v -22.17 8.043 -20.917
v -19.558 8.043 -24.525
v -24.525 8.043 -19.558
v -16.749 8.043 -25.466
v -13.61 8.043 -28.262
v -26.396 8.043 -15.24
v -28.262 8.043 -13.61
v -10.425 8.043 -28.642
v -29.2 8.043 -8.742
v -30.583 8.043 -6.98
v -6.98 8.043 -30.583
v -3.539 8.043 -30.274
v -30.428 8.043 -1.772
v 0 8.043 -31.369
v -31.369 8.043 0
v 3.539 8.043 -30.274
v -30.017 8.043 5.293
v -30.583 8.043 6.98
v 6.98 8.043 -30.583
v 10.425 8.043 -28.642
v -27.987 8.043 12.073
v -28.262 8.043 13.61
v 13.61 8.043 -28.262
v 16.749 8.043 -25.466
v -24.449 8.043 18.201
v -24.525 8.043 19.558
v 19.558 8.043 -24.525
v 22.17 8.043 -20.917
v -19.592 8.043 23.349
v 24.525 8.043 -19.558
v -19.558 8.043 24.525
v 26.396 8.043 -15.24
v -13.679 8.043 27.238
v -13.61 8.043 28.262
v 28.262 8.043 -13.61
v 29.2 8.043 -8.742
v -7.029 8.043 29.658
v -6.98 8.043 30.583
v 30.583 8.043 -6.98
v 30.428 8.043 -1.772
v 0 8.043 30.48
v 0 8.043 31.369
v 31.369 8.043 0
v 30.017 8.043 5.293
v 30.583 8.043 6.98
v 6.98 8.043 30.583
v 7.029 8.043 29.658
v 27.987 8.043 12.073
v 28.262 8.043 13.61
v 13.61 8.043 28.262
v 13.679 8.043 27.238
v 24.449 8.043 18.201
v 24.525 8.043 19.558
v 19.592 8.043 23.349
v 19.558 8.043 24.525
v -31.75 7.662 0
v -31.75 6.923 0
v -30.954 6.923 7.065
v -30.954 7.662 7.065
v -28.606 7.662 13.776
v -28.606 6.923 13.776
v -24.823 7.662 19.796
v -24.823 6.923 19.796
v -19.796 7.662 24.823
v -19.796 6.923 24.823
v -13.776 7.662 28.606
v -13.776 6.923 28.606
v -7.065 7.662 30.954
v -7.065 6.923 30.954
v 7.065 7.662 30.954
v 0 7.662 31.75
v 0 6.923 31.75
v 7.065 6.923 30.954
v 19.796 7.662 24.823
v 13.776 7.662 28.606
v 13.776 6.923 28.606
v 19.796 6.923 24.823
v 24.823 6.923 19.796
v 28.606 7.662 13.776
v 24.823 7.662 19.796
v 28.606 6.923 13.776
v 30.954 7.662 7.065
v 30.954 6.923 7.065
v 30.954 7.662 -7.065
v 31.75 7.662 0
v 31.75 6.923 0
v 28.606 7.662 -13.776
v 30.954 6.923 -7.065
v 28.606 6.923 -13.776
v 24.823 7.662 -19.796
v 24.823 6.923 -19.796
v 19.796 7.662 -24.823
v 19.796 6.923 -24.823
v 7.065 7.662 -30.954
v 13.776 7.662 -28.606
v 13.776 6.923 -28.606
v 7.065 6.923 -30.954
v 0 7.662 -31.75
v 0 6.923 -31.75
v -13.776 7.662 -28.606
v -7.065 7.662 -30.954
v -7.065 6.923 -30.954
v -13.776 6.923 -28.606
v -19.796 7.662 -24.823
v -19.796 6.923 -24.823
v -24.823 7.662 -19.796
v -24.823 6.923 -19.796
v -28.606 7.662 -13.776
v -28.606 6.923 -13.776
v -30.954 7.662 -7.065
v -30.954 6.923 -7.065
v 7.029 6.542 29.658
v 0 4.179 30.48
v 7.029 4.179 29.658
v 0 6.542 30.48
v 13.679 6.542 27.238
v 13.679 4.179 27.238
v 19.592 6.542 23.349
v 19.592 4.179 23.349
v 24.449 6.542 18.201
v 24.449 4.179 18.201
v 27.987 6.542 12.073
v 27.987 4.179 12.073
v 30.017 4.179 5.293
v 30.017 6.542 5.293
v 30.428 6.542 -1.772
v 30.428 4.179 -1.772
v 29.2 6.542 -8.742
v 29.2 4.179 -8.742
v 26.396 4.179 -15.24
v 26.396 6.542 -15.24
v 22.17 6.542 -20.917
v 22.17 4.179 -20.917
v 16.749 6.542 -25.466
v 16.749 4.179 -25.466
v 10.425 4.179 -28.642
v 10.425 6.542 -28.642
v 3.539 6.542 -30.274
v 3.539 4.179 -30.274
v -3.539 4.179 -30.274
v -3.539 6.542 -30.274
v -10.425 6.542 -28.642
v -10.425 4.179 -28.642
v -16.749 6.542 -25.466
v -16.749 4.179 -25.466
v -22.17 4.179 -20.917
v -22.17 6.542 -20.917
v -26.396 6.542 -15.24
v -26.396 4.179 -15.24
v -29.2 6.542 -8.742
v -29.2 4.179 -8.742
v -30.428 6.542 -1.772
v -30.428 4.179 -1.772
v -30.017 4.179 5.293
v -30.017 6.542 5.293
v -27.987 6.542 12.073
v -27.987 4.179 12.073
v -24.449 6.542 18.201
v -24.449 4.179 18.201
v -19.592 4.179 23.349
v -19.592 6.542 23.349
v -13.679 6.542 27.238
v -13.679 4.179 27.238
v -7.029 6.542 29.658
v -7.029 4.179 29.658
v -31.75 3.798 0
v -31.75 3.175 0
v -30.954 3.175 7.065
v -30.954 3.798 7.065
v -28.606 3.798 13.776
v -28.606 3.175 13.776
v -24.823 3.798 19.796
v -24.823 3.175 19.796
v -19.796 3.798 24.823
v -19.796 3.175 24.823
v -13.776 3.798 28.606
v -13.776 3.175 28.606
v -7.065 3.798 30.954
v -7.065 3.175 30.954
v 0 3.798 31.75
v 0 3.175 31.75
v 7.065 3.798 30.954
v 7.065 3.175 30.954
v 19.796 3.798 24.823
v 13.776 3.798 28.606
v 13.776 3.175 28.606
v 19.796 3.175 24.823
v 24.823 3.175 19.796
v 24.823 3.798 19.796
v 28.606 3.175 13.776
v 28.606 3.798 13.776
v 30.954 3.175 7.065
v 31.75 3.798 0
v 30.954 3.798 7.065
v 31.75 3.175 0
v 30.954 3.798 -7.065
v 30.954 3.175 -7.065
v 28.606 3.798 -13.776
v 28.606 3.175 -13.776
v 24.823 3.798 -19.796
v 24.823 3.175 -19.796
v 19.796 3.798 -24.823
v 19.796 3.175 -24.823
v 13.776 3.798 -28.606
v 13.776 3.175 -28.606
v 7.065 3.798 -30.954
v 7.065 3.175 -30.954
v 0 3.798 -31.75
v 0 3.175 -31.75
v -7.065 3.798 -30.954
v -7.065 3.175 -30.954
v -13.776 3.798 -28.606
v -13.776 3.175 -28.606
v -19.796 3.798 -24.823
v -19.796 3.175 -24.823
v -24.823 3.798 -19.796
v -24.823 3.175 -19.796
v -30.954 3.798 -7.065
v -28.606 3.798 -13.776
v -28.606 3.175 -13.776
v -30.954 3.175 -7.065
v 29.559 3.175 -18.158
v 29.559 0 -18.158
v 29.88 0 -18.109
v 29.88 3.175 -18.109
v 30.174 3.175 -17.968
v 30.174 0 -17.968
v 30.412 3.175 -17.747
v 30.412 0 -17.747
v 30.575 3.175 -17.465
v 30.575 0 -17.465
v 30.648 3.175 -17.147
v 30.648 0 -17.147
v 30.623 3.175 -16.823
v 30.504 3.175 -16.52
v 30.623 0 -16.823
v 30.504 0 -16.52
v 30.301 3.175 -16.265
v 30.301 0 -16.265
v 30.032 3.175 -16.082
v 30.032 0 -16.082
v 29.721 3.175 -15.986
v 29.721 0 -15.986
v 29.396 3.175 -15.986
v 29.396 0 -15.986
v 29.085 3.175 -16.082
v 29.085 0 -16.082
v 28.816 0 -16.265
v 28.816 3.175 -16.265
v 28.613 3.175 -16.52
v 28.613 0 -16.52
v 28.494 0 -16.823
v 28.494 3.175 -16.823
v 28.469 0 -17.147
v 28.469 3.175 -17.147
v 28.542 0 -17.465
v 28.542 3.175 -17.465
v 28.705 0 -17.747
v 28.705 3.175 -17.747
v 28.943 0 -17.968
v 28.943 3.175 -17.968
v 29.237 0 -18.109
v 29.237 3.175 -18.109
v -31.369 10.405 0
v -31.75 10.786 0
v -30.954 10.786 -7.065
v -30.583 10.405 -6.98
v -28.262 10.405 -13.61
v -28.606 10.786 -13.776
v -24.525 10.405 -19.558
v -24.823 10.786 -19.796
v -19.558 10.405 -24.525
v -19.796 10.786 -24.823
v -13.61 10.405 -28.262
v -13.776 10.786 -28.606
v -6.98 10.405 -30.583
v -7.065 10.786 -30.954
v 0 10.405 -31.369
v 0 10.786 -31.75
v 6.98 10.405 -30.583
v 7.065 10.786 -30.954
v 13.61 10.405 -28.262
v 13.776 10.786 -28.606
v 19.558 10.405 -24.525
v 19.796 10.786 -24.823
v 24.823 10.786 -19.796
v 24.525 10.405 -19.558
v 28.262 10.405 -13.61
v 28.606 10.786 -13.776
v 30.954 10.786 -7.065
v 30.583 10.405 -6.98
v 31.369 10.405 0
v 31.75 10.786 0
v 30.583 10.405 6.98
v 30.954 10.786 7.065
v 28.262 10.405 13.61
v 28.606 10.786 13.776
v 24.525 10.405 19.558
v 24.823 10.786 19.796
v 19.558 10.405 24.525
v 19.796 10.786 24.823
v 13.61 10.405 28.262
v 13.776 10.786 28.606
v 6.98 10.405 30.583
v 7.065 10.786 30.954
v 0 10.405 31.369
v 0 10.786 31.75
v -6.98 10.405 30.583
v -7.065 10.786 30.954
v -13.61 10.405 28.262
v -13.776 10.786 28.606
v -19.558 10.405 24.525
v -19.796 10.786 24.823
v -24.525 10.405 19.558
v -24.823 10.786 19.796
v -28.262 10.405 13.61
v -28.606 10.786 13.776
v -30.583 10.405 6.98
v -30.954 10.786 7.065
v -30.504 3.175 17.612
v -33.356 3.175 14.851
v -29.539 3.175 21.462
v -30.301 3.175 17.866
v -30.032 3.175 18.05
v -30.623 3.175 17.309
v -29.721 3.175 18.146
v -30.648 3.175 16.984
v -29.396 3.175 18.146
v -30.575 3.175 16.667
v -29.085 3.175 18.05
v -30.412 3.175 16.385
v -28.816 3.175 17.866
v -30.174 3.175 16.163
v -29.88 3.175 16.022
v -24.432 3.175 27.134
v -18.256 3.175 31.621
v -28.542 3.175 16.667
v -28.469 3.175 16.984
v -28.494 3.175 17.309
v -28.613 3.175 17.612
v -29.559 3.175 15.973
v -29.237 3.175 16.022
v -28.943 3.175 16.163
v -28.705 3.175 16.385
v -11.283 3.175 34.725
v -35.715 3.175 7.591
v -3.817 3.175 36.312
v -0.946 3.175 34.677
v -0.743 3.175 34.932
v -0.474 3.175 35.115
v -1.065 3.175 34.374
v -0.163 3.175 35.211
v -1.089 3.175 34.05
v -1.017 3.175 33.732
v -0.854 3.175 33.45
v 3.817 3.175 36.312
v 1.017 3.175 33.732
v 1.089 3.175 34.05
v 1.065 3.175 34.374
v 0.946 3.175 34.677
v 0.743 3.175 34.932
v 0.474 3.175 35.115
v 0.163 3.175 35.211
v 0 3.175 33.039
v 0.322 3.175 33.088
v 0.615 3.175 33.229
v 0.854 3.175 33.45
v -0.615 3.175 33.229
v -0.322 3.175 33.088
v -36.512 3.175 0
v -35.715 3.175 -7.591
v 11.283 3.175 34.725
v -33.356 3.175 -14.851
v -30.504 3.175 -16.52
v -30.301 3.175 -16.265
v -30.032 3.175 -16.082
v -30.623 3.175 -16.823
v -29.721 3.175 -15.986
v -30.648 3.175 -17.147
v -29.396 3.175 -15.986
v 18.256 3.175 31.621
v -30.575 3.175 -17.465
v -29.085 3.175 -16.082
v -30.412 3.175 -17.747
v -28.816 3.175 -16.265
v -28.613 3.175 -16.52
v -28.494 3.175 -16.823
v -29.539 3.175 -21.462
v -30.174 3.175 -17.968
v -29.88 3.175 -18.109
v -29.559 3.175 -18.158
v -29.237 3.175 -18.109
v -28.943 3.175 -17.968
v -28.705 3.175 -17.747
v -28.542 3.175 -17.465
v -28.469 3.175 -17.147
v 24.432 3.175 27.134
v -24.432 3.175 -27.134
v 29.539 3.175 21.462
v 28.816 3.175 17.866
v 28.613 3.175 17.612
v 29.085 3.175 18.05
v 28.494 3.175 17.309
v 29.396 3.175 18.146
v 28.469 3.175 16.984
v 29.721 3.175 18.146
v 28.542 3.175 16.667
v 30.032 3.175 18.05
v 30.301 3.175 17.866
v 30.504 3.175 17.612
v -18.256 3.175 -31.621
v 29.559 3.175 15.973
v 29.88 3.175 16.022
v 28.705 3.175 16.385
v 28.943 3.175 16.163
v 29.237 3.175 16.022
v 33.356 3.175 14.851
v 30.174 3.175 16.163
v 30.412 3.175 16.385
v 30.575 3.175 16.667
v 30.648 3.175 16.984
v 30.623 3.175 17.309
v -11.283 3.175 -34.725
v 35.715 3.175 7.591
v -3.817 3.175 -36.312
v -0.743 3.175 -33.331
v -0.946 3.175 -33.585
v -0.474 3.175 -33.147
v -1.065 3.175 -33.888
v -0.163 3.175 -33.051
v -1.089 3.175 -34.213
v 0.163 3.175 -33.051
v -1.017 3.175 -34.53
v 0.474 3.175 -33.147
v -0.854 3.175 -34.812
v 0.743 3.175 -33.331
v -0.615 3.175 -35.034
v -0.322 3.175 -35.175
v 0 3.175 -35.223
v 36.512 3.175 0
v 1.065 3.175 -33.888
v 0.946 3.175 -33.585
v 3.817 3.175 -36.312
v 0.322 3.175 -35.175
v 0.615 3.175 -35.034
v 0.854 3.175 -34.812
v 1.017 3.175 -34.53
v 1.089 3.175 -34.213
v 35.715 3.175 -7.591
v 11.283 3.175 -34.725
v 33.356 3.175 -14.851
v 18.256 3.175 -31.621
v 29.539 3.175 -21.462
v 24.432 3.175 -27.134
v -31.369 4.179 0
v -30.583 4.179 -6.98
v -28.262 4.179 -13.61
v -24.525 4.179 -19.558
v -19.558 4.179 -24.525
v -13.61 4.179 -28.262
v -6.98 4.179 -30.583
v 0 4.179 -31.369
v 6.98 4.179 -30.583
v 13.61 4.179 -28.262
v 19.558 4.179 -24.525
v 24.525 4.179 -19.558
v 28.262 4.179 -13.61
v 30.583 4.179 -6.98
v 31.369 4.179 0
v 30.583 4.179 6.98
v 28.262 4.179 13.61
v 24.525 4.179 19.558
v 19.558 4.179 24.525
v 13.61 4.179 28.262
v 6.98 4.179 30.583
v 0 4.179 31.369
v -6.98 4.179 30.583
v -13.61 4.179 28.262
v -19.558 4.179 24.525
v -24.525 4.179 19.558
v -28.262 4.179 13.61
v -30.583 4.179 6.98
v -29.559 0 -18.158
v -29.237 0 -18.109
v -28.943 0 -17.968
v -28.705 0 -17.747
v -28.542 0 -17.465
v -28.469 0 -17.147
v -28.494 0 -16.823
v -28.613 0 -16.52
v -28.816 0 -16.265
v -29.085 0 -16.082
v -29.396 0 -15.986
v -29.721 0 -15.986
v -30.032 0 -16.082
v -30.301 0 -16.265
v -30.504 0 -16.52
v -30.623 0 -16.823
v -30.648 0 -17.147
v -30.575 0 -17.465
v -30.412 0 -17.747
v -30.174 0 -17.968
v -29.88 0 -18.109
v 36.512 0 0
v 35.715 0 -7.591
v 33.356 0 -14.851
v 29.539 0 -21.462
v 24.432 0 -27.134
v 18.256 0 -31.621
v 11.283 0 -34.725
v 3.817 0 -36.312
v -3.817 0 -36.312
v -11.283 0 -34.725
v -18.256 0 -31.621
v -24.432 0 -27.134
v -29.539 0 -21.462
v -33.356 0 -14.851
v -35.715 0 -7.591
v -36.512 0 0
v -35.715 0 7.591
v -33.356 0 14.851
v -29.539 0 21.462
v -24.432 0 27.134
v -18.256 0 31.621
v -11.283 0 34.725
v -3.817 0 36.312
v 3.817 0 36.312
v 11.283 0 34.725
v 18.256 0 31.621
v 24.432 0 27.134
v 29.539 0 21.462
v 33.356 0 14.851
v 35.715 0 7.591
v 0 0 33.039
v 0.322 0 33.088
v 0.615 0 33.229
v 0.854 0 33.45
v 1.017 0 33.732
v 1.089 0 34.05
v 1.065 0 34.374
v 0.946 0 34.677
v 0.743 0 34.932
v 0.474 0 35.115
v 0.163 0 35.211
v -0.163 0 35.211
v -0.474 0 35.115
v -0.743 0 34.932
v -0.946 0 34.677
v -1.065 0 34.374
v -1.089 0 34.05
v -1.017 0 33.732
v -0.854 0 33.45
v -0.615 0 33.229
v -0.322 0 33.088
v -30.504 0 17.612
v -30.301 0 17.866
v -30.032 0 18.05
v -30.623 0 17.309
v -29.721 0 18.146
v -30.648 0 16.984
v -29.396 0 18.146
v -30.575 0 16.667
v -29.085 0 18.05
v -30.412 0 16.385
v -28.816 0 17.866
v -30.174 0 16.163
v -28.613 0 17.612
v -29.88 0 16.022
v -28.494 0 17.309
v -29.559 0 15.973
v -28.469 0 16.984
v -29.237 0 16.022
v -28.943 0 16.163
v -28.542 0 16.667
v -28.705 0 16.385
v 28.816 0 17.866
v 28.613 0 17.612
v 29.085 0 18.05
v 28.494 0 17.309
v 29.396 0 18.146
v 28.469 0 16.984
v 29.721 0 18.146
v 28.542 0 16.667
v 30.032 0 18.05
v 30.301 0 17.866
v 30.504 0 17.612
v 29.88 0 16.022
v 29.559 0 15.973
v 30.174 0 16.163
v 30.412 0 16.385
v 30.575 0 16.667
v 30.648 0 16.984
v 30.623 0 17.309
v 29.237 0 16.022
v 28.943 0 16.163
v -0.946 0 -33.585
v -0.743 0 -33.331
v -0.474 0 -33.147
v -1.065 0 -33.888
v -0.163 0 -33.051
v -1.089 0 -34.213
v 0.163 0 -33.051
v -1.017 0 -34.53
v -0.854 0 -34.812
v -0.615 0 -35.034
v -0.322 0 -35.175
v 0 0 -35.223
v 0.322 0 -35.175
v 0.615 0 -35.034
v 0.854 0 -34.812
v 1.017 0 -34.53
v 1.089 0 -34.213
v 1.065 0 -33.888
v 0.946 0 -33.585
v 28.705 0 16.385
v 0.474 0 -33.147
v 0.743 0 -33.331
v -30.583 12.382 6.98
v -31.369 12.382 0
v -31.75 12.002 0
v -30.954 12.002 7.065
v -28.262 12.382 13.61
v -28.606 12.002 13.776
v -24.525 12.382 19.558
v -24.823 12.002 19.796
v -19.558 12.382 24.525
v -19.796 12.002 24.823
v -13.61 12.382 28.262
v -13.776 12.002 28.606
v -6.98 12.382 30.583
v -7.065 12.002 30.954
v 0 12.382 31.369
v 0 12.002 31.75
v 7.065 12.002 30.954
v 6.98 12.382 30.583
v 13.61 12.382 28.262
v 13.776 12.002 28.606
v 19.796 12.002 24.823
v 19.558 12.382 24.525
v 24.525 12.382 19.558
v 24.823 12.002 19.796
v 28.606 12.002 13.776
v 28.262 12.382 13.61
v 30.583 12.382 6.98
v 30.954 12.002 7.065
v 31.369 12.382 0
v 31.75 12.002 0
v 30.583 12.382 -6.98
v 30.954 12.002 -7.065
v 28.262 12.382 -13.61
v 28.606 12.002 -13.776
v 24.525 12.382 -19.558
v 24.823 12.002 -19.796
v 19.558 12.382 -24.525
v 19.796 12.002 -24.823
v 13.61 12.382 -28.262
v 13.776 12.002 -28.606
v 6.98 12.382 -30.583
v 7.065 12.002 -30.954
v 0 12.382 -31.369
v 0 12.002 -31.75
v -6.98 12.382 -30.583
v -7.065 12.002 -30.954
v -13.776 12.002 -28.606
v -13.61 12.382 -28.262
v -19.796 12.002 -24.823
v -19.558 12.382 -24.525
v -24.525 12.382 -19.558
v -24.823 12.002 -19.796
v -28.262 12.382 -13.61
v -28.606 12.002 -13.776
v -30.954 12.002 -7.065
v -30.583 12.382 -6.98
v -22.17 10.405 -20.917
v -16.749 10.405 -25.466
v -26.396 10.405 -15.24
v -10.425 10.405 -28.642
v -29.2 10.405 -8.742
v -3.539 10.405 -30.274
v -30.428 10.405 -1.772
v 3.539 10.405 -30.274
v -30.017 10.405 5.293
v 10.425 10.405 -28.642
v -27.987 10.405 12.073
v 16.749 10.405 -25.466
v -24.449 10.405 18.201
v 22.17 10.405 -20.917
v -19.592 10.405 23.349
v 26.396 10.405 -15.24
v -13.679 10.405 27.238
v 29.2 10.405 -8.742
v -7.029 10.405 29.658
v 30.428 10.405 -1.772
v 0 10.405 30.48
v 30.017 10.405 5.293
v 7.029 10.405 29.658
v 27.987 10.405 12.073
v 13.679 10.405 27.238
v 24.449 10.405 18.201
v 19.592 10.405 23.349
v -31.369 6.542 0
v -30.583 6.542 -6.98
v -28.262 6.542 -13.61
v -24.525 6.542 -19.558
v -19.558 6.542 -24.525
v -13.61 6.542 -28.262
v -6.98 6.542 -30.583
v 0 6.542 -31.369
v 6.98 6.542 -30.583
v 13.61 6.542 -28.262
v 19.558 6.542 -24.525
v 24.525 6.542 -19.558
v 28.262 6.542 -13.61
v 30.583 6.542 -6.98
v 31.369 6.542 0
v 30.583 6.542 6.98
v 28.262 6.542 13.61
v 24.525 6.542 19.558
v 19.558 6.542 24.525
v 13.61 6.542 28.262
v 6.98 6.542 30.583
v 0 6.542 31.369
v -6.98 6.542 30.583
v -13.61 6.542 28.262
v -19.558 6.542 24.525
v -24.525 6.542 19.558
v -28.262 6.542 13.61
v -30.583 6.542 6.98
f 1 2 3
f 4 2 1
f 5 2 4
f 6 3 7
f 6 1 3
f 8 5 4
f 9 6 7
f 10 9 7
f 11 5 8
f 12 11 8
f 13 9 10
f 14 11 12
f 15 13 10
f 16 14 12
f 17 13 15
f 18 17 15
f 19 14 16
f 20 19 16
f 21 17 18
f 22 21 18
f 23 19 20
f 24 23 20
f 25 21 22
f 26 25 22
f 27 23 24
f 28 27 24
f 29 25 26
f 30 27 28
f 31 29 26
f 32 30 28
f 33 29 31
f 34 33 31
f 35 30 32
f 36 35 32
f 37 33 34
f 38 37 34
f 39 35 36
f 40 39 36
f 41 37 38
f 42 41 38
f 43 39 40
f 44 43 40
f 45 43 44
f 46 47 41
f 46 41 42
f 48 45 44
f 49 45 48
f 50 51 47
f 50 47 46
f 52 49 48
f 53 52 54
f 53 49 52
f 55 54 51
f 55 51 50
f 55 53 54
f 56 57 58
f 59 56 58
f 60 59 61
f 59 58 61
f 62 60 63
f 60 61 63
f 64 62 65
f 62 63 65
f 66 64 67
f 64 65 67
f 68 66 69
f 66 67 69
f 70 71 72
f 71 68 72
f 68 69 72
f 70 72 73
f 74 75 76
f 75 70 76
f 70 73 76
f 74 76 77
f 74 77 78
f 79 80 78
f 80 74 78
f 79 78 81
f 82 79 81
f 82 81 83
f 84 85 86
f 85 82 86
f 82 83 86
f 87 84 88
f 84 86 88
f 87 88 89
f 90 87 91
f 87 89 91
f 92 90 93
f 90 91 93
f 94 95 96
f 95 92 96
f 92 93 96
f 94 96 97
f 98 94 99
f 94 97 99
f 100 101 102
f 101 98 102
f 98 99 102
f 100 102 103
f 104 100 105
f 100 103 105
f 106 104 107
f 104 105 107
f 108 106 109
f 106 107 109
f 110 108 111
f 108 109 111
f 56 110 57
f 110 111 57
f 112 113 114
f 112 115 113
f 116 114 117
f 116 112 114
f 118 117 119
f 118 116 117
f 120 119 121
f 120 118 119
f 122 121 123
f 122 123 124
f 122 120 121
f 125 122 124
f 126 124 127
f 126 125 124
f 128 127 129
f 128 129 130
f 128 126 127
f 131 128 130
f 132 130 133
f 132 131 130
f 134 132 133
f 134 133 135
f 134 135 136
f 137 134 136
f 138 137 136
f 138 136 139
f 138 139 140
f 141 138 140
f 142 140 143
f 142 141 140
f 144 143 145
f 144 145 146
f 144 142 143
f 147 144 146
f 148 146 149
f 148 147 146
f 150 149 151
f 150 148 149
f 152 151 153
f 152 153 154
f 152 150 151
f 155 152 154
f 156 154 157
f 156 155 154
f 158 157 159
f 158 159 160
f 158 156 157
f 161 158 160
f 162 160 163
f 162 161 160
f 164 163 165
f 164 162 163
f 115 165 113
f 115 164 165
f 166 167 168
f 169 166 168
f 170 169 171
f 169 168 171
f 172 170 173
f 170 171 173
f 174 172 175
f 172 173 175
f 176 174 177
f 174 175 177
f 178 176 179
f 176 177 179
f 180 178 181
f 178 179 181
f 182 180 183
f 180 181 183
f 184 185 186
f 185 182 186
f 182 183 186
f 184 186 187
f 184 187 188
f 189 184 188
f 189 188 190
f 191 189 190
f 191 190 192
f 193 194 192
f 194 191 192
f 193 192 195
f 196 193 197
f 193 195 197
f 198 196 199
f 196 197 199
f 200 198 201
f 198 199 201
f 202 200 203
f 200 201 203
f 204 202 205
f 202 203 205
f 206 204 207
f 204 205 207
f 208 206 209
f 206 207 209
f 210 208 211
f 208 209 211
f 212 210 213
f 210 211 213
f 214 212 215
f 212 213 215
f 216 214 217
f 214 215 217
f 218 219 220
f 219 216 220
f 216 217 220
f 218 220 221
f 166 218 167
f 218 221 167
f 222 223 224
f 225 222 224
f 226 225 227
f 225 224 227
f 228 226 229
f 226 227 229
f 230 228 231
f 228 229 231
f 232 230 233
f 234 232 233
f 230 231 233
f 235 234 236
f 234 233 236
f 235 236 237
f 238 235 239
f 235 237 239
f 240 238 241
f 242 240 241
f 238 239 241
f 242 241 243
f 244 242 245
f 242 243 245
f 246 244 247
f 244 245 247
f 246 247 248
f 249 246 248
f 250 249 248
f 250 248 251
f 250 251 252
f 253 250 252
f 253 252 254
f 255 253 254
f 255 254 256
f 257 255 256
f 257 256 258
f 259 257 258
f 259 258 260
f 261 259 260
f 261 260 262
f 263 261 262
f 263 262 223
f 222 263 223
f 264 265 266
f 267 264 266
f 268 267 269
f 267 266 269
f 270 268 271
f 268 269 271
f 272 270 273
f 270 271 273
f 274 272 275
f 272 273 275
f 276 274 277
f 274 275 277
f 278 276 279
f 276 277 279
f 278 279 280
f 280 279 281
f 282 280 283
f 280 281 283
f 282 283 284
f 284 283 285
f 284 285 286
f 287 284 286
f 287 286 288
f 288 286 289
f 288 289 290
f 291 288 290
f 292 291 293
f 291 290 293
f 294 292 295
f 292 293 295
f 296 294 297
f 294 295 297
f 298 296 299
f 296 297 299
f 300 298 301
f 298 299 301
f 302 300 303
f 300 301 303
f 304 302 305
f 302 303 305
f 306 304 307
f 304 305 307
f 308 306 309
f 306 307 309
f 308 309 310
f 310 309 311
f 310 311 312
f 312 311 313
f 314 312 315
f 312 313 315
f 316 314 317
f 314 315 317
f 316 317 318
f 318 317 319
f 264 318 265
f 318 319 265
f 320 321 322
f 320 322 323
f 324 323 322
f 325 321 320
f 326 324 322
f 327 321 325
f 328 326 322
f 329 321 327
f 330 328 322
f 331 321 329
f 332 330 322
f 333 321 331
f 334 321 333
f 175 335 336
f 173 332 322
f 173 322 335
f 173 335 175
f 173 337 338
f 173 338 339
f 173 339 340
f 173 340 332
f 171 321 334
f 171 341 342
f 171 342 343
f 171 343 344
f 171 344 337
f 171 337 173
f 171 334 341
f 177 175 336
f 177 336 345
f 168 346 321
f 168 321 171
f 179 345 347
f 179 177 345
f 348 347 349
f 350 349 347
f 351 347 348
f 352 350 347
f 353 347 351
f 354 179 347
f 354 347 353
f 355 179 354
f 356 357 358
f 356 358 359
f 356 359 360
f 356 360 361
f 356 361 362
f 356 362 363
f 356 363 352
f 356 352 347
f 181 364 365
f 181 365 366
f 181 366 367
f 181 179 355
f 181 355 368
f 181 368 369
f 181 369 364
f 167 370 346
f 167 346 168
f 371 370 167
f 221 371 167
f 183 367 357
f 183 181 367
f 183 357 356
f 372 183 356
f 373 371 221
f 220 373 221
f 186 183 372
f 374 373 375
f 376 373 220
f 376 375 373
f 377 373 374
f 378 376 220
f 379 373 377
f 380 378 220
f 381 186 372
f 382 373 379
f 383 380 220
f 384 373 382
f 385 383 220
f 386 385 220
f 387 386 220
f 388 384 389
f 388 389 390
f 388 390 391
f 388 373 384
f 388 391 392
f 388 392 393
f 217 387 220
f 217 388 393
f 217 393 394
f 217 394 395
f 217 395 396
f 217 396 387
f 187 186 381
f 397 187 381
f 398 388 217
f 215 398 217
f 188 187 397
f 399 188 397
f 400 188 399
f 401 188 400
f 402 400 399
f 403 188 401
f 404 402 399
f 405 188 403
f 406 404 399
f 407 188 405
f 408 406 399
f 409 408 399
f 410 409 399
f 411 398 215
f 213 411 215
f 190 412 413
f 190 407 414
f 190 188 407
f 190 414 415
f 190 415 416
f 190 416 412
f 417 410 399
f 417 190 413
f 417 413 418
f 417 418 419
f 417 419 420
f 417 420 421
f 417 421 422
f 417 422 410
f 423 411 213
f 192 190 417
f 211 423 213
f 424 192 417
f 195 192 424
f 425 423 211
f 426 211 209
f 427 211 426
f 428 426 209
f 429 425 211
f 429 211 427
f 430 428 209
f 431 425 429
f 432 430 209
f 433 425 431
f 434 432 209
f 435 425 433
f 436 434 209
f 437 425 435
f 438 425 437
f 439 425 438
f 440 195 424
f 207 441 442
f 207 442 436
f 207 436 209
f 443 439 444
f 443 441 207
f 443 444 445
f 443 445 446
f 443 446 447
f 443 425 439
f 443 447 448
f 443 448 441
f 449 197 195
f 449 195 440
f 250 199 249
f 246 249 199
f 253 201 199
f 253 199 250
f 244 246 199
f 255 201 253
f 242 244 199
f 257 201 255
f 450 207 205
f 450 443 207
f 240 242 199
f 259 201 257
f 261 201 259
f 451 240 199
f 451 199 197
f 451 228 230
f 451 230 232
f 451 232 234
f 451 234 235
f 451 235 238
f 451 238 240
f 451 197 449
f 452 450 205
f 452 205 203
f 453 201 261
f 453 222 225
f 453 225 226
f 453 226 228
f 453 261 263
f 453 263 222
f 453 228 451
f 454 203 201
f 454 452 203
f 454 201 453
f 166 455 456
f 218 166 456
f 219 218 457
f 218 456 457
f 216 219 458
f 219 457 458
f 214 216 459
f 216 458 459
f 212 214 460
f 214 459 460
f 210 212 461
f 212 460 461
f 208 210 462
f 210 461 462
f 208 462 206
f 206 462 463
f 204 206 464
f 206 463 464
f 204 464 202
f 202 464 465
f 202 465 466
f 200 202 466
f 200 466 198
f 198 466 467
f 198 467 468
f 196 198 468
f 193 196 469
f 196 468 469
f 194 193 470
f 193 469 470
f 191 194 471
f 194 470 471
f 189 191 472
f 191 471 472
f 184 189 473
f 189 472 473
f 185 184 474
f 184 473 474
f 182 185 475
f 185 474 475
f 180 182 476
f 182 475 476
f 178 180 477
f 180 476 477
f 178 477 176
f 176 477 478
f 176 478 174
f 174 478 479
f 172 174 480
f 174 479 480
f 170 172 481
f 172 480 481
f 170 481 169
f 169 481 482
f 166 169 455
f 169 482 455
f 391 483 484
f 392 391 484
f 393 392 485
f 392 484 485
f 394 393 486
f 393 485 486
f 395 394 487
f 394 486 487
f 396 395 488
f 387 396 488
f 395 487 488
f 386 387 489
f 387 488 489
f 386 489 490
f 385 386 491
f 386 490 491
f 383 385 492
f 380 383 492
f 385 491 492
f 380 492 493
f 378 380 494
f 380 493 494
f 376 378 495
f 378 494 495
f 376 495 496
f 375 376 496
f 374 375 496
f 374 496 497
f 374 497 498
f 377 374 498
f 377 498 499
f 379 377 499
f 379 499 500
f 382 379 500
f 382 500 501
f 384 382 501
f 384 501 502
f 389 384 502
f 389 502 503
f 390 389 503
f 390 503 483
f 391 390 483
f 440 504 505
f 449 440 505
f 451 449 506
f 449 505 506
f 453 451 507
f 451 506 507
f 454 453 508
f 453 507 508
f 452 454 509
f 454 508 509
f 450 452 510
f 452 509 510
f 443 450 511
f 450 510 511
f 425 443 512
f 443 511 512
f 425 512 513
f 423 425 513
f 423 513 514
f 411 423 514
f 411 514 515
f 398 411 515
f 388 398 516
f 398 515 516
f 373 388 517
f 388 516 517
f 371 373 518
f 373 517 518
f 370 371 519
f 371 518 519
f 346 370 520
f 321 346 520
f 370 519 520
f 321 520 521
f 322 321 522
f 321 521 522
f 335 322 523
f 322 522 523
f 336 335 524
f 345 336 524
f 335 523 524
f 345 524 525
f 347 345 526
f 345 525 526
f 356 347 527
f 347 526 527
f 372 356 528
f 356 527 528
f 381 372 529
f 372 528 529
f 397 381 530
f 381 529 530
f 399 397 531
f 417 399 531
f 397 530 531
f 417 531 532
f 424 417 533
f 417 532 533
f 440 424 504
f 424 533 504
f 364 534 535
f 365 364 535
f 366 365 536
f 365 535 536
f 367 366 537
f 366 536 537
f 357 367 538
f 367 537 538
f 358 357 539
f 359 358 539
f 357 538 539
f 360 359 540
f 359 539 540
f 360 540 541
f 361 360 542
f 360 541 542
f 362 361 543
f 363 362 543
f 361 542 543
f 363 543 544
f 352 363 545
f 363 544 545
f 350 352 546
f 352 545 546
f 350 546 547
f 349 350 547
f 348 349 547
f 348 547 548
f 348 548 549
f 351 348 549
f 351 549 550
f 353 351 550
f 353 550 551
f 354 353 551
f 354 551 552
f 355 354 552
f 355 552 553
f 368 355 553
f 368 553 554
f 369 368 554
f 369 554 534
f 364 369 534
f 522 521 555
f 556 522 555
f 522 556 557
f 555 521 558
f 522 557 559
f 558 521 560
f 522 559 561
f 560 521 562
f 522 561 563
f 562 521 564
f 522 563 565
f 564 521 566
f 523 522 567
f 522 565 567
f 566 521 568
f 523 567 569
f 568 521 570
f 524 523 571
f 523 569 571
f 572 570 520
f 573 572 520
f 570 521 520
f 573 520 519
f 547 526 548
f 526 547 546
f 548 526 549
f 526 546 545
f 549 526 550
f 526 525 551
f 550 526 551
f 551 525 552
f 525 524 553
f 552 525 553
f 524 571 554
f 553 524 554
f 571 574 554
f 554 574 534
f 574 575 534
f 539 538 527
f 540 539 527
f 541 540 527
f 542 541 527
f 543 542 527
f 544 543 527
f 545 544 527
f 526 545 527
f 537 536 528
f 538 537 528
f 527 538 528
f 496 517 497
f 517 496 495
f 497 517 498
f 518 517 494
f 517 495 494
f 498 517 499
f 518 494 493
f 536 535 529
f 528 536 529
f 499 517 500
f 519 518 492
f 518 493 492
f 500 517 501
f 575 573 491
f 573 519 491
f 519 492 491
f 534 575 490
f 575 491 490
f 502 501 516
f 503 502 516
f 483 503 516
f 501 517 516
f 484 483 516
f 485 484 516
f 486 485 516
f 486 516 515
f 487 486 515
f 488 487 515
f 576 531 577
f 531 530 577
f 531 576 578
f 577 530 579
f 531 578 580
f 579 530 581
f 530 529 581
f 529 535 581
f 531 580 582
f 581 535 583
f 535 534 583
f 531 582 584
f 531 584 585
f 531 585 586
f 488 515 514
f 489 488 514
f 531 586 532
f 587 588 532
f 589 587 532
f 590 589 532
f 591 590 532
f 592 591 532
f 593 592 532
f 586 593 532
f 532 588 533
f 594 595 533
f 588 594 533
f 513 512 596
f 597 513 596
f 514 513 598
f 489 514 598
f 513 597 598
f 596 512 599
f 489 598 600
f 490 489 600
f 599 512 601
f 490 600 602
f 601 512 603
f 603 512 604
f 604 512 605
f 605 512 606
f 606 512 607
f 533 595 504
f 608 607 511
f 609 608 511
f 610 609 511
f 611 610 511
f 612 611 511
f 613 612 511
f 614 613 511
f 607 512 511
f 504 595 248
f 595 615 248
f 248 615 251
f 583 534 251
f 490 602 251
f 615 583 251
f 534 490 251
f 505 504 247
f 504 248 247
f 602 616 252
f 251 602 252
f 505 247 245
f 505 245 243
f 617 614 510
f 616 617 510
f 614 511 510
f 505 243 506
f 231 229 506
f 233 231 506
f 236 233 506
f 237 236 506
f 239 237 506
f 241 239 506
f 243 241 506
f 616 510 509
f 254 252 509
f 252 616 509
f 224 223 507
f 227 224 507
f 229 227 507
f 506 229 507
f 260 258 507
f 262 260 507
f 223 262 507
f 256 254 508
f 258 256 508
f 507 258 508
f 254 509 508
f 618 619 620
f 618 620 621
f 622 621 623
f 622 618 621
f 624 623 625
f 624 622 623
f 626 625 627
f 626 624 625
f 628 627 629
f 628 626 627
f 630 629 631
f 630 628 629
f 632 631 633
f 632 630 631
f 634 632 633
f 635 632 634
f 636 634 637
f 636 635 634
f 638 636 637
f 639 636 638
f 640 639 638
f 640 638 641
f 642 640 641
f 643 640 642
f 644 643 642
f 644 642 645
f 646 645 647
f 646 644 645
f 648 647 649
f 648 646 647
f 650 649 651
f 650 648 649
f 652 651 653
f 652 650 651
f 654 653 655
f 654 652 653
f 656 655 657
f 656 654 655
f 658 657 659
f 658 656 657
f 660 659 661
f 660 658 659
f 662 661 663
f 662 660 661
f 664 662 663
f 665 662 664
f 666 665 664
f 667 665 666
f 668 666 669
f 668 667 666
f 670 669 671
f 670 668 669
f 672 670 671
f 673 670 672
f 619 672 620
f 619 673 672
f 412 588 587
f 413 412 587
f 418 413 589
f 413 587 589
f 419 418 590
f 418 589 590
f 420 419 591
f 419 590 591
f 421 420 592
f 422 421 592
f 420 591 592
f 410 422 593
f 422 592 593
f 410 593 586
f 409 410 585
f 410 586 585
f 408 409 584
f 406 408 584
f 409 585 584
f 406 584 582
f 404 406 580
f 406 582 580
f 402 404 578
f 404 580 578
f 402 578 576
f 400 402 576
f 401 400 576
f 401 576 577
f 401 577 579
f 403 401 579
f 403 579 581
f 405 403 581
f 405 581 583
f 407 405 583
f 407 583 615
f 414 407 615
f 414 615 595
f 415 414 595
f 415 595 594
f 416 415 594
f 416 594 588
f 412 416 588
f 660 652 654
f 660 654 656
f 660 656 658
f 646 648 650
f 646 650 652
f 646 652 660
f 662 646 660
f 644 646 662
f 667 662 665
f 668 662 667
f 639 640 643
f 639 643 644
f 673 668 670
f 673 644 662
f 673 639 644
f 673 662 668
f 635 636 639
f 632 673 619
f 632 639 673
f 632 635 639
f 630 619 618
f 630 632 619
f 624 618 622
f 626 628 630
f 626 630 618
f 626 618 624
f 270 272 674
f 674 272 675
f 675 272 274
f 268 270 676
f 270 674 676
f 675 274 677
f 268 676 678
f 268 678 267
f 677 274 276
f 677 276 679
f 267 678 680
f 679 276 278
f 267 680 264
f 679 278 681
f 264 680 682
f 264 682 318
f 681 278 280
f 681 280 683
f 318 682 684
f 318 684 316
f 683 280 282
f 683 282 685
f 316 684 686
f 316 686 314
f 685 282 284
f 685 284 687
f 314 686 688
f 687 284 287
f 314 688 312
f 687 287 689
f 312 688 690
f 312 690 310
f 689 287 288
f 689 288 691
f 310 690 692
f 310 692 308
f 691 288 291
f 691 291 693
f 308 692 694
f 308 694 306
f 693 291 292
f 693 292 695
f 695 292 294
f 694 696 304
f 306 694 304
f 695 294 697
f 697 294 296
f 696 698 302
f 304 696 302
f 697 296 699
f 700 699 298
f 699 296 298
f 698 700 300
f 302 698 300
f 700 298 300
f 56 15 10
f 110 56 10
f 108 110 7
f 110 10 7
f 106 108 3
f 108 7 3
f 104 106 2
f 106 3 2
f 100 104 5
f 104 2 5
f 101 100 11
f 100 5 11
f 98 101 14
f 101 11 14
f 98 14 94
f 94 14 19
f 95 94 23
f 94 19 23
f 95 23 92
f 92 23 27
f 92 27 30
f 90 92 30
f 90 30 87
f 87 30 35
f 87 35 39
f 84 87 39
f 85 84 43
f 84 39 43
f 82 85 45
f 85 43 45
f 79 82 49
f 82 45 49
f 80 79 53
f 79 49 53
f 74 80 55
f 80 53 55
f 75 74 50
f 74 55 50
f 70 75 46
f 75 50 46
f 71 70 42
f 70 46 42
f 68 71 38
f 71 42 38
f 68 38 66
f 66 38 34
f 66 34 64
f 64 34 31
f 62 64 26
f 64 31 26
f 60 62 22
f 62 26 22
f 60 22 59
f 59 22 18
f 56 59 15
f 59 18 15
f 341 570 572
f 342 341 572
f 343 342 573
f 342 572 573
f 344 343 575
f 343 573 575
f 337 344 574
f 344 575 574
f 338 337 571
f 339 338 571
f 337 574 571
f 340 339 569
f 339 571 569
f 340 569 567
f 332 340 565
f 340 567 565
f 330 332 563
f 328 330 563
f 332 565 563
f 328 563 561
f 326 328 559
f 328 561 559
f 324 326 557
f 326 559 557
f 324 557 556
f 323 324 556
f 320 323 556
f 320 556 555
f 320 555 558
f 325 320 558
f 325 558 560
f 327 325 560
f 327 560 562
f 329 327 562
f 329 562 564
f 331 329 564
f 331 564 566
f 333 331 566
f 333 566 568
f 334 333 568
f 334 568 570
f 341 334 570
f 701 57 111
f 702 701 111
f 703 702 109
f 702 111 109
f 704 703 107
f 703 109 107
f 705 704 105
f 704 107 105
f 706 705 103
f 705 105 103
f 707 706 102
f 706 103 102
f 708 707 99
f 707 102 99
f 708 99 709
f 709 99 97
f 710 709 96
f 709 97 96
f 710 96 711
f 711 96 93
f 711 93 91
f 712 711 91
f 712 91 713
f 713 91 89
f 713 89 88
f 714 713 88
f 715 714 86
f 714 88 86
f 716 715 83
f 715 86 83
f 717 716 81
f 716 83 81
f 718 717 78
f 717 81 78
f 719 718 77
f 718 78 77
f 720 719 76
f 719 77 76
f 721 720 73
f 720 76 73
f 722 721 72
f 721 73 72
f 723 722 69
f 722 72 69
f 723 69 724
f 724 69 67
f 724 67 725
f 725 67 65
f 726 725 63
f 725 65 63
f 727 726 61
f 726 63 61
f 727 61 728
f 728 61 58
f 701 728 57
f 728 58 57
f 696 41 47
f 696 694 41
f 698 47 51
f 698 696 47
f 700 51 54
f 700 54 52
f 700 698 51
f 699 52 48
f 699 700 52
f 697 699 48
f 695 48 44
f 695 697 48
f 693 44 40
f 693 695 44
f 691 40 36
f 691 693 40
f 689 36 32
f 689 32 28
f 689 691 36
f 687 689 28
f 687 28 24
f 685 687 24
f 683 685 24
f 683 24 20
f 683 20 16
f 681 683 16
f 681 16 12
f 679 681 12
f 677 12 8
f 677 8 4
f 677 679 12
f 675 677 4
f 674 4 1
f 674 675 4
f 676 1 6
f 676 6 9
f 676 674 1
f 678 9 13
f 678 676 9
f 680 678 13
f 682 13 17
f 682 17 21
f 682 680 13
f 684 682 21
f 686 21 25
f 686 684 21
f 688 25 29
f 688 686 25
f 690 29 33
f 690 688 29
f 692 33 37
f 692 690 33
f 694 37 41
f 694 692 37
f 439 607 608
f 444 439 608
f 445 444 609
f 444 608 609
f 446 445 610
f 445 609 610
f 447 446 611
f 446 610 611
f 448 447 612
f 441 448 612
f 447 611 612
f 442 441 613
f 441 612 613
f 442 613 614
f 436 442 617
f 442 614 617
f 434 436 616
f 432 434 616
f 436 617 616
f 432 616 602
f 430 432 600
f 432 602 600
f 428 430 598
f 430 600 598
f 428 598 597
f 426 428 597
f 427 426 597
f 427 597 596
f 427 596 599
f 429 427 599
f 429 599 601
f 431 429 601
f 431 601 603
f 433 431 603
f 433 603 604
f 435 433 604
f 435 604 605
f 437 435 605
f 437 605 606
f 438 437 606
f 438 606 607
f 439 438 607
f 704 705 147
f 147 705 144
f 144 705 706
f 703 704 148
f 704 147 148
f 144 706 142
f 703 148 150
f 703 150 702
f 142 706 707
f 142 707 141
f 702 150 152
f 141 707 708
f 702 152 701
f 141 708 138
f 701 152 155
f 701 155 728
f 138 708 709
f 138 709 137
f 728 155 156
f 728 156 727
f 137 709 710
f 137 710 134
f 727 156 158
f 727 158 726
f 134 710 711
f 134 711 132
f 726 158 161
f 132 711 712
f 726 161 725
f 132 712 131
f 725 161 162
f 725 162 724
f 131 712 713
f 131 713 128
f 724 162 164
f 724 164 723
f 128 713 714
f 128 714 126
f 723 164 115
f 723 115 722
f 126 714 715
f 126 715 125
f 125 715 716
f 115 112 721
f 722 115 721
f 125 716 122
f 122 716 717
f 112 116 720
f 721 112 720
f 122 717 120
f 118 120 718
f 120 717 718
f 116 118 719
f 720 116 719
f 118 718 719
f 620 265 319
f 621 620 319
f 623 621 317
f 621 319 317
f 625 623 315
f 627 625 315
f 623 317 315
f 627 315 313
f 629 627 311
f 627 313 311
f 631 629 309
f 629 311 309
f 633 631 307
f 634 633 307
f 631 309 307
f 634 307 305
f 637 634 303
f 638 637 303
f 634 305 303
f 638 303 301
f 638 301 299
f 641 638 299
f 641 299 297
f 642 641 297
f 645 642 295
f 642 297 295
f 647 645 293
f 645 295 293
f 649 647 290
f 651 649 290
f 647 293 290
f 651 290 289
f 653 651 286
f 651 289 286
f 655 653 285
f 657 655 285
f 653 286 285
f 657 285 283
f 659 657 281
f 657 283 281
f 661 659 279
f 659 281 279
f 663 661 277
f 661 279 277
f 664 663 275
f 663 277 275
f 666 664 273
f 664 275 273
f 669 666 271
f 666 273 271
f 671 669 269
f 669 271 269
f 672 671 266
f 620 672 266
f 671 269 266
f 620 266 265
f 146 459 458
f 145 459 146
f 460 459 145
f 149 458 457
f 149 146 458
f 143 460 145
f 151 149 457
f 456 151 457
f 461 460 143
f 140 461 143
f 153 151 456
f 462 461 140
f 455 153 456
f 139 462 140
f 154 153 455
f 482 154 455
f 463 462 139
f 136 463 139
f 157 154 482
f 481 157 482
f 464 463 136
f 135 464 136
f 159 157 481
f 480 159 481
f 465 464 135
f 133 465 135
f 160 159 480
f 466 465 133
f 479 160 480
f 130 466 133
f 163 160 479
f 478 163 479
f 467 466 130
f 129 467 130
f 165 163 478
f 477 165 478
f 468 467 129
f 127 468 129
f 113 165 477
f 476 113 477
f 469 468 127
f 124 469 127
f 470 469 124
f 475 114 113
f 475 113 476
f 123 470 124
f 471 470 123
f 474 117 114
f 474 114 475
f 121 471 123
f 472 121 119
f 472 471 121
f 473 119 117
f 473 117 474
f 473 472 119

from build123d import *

# Parameters (mm, degrees)
SKETCH1_R                       = 36.5125
EXTRUDE1_DEPTH                  = 3.175
SKETCH2_R                       = 31.75
EXTRUDE2_DEPTH                  = 9.2075
SKETCH4_W                       = 1.27
SKETCH4_H                       = 2.3622
CHAMFER1_SIZE                   = 0.381
F_2_56_TAPPED_HOLE1_D           = 1.778
F_2_56_TAPPED_HOLE1_DEPTH       = 5.588
F_2_56_TAPPED_HOLE1_CBORE_D     = 2.1844
F_2_56_TAPPED_HOLE1_CBORE_DEPTH = 4.318
F_2_56_TAPPED_HOLE1_TIP         = 0.53416509


with BuildPart() as part:
    # Sketch1 → Extrude1 (new body)
    with BuildSketch(Plane(origin=(0, 0, 0), x_dir=(1, 0, 0), z_dir=(0, 1, 0))):
        Circle(SKETCH1_R)
    extrude(amount=EXTRUDE1_DEPTH)

    # Sketch2 → Extrude2 (add)
    with BuildSketch(Plane(origin=(0, 3.175, 0), x_dir=(-1, 0, 0), z_dir=(0, 1, 0))):
        Circle(SKETCH2_R)
    extrude(amount=EXTRUDE2_DEPTH)

    # Sketch4 → Cut-Revolve7 (revolve, cut)
    with BuildSketch(Plane(origin=(0, 0, 0), x_dir=(0, 0, -1), z_dir=(1, 0, 0))):
        with Locations((-31.115, 9.224034757)):
            Rectangle(SKETCH4_W, SKETCH4_H)
        with Locations((-31.115, 5.360539726)):
            Rectangle(SKETCH4_W, SKETCH4_H)
    revolve(axis=Axis((0, 0, 0), (0, 1, 0)), mode=Mode.SUBTRACT)

    # Chamfer1
    chamfer1_edges = [part.edges().sort_by_distance(p)[0] for p in [
        (31.75, 10.405134757, 0),
        (31.75, 8.042934757, 0),
        (31.75, 6.541639726, 0),
        (31.75, 4.179439726, 0),
        (31.75, 12.3825, 0),
    ]]
    chamfer(chamfer1_edges, length=CHAMFER1_SIZE)

    # #2-56 Tapped Hole1
    with Locations(Plane(origin=(-29.558529563, 0, 17.065625), x_dir=(0, 0, -1), z_dir=(0, -1, 0))):
        with Locations((0, 0), (-17.065625, 29.558529563), (0, 59.117059126), (34.13125, 59.117059126), (51.196875, 29.558529563), (34.13125, 0)):
            CounterBoreHole(F_2_56_TAPPED_HOLE1_D / 2, F_2_56_TAPPED_HOLE1_CBORE_D / 2, F_2_56_TAPPED_HOLE1_CBORE_DEPTH, depth=F_2_56_TAPPED_HOLE1_DEPTH)
            with Locations((0, 0, -(F_2_56_TAPPED_HOLE1_DEPTH + F_2_56_TAPPED_HOLE1_TIP / 2))):  # 118° drill point
                Cone(0, F_2_56_TAPPED_HOLE1_D / 2, F_2_56_TAPPED_HOLE1_TIP, mode=Mode.SUBTRACT)


solid = part.part
